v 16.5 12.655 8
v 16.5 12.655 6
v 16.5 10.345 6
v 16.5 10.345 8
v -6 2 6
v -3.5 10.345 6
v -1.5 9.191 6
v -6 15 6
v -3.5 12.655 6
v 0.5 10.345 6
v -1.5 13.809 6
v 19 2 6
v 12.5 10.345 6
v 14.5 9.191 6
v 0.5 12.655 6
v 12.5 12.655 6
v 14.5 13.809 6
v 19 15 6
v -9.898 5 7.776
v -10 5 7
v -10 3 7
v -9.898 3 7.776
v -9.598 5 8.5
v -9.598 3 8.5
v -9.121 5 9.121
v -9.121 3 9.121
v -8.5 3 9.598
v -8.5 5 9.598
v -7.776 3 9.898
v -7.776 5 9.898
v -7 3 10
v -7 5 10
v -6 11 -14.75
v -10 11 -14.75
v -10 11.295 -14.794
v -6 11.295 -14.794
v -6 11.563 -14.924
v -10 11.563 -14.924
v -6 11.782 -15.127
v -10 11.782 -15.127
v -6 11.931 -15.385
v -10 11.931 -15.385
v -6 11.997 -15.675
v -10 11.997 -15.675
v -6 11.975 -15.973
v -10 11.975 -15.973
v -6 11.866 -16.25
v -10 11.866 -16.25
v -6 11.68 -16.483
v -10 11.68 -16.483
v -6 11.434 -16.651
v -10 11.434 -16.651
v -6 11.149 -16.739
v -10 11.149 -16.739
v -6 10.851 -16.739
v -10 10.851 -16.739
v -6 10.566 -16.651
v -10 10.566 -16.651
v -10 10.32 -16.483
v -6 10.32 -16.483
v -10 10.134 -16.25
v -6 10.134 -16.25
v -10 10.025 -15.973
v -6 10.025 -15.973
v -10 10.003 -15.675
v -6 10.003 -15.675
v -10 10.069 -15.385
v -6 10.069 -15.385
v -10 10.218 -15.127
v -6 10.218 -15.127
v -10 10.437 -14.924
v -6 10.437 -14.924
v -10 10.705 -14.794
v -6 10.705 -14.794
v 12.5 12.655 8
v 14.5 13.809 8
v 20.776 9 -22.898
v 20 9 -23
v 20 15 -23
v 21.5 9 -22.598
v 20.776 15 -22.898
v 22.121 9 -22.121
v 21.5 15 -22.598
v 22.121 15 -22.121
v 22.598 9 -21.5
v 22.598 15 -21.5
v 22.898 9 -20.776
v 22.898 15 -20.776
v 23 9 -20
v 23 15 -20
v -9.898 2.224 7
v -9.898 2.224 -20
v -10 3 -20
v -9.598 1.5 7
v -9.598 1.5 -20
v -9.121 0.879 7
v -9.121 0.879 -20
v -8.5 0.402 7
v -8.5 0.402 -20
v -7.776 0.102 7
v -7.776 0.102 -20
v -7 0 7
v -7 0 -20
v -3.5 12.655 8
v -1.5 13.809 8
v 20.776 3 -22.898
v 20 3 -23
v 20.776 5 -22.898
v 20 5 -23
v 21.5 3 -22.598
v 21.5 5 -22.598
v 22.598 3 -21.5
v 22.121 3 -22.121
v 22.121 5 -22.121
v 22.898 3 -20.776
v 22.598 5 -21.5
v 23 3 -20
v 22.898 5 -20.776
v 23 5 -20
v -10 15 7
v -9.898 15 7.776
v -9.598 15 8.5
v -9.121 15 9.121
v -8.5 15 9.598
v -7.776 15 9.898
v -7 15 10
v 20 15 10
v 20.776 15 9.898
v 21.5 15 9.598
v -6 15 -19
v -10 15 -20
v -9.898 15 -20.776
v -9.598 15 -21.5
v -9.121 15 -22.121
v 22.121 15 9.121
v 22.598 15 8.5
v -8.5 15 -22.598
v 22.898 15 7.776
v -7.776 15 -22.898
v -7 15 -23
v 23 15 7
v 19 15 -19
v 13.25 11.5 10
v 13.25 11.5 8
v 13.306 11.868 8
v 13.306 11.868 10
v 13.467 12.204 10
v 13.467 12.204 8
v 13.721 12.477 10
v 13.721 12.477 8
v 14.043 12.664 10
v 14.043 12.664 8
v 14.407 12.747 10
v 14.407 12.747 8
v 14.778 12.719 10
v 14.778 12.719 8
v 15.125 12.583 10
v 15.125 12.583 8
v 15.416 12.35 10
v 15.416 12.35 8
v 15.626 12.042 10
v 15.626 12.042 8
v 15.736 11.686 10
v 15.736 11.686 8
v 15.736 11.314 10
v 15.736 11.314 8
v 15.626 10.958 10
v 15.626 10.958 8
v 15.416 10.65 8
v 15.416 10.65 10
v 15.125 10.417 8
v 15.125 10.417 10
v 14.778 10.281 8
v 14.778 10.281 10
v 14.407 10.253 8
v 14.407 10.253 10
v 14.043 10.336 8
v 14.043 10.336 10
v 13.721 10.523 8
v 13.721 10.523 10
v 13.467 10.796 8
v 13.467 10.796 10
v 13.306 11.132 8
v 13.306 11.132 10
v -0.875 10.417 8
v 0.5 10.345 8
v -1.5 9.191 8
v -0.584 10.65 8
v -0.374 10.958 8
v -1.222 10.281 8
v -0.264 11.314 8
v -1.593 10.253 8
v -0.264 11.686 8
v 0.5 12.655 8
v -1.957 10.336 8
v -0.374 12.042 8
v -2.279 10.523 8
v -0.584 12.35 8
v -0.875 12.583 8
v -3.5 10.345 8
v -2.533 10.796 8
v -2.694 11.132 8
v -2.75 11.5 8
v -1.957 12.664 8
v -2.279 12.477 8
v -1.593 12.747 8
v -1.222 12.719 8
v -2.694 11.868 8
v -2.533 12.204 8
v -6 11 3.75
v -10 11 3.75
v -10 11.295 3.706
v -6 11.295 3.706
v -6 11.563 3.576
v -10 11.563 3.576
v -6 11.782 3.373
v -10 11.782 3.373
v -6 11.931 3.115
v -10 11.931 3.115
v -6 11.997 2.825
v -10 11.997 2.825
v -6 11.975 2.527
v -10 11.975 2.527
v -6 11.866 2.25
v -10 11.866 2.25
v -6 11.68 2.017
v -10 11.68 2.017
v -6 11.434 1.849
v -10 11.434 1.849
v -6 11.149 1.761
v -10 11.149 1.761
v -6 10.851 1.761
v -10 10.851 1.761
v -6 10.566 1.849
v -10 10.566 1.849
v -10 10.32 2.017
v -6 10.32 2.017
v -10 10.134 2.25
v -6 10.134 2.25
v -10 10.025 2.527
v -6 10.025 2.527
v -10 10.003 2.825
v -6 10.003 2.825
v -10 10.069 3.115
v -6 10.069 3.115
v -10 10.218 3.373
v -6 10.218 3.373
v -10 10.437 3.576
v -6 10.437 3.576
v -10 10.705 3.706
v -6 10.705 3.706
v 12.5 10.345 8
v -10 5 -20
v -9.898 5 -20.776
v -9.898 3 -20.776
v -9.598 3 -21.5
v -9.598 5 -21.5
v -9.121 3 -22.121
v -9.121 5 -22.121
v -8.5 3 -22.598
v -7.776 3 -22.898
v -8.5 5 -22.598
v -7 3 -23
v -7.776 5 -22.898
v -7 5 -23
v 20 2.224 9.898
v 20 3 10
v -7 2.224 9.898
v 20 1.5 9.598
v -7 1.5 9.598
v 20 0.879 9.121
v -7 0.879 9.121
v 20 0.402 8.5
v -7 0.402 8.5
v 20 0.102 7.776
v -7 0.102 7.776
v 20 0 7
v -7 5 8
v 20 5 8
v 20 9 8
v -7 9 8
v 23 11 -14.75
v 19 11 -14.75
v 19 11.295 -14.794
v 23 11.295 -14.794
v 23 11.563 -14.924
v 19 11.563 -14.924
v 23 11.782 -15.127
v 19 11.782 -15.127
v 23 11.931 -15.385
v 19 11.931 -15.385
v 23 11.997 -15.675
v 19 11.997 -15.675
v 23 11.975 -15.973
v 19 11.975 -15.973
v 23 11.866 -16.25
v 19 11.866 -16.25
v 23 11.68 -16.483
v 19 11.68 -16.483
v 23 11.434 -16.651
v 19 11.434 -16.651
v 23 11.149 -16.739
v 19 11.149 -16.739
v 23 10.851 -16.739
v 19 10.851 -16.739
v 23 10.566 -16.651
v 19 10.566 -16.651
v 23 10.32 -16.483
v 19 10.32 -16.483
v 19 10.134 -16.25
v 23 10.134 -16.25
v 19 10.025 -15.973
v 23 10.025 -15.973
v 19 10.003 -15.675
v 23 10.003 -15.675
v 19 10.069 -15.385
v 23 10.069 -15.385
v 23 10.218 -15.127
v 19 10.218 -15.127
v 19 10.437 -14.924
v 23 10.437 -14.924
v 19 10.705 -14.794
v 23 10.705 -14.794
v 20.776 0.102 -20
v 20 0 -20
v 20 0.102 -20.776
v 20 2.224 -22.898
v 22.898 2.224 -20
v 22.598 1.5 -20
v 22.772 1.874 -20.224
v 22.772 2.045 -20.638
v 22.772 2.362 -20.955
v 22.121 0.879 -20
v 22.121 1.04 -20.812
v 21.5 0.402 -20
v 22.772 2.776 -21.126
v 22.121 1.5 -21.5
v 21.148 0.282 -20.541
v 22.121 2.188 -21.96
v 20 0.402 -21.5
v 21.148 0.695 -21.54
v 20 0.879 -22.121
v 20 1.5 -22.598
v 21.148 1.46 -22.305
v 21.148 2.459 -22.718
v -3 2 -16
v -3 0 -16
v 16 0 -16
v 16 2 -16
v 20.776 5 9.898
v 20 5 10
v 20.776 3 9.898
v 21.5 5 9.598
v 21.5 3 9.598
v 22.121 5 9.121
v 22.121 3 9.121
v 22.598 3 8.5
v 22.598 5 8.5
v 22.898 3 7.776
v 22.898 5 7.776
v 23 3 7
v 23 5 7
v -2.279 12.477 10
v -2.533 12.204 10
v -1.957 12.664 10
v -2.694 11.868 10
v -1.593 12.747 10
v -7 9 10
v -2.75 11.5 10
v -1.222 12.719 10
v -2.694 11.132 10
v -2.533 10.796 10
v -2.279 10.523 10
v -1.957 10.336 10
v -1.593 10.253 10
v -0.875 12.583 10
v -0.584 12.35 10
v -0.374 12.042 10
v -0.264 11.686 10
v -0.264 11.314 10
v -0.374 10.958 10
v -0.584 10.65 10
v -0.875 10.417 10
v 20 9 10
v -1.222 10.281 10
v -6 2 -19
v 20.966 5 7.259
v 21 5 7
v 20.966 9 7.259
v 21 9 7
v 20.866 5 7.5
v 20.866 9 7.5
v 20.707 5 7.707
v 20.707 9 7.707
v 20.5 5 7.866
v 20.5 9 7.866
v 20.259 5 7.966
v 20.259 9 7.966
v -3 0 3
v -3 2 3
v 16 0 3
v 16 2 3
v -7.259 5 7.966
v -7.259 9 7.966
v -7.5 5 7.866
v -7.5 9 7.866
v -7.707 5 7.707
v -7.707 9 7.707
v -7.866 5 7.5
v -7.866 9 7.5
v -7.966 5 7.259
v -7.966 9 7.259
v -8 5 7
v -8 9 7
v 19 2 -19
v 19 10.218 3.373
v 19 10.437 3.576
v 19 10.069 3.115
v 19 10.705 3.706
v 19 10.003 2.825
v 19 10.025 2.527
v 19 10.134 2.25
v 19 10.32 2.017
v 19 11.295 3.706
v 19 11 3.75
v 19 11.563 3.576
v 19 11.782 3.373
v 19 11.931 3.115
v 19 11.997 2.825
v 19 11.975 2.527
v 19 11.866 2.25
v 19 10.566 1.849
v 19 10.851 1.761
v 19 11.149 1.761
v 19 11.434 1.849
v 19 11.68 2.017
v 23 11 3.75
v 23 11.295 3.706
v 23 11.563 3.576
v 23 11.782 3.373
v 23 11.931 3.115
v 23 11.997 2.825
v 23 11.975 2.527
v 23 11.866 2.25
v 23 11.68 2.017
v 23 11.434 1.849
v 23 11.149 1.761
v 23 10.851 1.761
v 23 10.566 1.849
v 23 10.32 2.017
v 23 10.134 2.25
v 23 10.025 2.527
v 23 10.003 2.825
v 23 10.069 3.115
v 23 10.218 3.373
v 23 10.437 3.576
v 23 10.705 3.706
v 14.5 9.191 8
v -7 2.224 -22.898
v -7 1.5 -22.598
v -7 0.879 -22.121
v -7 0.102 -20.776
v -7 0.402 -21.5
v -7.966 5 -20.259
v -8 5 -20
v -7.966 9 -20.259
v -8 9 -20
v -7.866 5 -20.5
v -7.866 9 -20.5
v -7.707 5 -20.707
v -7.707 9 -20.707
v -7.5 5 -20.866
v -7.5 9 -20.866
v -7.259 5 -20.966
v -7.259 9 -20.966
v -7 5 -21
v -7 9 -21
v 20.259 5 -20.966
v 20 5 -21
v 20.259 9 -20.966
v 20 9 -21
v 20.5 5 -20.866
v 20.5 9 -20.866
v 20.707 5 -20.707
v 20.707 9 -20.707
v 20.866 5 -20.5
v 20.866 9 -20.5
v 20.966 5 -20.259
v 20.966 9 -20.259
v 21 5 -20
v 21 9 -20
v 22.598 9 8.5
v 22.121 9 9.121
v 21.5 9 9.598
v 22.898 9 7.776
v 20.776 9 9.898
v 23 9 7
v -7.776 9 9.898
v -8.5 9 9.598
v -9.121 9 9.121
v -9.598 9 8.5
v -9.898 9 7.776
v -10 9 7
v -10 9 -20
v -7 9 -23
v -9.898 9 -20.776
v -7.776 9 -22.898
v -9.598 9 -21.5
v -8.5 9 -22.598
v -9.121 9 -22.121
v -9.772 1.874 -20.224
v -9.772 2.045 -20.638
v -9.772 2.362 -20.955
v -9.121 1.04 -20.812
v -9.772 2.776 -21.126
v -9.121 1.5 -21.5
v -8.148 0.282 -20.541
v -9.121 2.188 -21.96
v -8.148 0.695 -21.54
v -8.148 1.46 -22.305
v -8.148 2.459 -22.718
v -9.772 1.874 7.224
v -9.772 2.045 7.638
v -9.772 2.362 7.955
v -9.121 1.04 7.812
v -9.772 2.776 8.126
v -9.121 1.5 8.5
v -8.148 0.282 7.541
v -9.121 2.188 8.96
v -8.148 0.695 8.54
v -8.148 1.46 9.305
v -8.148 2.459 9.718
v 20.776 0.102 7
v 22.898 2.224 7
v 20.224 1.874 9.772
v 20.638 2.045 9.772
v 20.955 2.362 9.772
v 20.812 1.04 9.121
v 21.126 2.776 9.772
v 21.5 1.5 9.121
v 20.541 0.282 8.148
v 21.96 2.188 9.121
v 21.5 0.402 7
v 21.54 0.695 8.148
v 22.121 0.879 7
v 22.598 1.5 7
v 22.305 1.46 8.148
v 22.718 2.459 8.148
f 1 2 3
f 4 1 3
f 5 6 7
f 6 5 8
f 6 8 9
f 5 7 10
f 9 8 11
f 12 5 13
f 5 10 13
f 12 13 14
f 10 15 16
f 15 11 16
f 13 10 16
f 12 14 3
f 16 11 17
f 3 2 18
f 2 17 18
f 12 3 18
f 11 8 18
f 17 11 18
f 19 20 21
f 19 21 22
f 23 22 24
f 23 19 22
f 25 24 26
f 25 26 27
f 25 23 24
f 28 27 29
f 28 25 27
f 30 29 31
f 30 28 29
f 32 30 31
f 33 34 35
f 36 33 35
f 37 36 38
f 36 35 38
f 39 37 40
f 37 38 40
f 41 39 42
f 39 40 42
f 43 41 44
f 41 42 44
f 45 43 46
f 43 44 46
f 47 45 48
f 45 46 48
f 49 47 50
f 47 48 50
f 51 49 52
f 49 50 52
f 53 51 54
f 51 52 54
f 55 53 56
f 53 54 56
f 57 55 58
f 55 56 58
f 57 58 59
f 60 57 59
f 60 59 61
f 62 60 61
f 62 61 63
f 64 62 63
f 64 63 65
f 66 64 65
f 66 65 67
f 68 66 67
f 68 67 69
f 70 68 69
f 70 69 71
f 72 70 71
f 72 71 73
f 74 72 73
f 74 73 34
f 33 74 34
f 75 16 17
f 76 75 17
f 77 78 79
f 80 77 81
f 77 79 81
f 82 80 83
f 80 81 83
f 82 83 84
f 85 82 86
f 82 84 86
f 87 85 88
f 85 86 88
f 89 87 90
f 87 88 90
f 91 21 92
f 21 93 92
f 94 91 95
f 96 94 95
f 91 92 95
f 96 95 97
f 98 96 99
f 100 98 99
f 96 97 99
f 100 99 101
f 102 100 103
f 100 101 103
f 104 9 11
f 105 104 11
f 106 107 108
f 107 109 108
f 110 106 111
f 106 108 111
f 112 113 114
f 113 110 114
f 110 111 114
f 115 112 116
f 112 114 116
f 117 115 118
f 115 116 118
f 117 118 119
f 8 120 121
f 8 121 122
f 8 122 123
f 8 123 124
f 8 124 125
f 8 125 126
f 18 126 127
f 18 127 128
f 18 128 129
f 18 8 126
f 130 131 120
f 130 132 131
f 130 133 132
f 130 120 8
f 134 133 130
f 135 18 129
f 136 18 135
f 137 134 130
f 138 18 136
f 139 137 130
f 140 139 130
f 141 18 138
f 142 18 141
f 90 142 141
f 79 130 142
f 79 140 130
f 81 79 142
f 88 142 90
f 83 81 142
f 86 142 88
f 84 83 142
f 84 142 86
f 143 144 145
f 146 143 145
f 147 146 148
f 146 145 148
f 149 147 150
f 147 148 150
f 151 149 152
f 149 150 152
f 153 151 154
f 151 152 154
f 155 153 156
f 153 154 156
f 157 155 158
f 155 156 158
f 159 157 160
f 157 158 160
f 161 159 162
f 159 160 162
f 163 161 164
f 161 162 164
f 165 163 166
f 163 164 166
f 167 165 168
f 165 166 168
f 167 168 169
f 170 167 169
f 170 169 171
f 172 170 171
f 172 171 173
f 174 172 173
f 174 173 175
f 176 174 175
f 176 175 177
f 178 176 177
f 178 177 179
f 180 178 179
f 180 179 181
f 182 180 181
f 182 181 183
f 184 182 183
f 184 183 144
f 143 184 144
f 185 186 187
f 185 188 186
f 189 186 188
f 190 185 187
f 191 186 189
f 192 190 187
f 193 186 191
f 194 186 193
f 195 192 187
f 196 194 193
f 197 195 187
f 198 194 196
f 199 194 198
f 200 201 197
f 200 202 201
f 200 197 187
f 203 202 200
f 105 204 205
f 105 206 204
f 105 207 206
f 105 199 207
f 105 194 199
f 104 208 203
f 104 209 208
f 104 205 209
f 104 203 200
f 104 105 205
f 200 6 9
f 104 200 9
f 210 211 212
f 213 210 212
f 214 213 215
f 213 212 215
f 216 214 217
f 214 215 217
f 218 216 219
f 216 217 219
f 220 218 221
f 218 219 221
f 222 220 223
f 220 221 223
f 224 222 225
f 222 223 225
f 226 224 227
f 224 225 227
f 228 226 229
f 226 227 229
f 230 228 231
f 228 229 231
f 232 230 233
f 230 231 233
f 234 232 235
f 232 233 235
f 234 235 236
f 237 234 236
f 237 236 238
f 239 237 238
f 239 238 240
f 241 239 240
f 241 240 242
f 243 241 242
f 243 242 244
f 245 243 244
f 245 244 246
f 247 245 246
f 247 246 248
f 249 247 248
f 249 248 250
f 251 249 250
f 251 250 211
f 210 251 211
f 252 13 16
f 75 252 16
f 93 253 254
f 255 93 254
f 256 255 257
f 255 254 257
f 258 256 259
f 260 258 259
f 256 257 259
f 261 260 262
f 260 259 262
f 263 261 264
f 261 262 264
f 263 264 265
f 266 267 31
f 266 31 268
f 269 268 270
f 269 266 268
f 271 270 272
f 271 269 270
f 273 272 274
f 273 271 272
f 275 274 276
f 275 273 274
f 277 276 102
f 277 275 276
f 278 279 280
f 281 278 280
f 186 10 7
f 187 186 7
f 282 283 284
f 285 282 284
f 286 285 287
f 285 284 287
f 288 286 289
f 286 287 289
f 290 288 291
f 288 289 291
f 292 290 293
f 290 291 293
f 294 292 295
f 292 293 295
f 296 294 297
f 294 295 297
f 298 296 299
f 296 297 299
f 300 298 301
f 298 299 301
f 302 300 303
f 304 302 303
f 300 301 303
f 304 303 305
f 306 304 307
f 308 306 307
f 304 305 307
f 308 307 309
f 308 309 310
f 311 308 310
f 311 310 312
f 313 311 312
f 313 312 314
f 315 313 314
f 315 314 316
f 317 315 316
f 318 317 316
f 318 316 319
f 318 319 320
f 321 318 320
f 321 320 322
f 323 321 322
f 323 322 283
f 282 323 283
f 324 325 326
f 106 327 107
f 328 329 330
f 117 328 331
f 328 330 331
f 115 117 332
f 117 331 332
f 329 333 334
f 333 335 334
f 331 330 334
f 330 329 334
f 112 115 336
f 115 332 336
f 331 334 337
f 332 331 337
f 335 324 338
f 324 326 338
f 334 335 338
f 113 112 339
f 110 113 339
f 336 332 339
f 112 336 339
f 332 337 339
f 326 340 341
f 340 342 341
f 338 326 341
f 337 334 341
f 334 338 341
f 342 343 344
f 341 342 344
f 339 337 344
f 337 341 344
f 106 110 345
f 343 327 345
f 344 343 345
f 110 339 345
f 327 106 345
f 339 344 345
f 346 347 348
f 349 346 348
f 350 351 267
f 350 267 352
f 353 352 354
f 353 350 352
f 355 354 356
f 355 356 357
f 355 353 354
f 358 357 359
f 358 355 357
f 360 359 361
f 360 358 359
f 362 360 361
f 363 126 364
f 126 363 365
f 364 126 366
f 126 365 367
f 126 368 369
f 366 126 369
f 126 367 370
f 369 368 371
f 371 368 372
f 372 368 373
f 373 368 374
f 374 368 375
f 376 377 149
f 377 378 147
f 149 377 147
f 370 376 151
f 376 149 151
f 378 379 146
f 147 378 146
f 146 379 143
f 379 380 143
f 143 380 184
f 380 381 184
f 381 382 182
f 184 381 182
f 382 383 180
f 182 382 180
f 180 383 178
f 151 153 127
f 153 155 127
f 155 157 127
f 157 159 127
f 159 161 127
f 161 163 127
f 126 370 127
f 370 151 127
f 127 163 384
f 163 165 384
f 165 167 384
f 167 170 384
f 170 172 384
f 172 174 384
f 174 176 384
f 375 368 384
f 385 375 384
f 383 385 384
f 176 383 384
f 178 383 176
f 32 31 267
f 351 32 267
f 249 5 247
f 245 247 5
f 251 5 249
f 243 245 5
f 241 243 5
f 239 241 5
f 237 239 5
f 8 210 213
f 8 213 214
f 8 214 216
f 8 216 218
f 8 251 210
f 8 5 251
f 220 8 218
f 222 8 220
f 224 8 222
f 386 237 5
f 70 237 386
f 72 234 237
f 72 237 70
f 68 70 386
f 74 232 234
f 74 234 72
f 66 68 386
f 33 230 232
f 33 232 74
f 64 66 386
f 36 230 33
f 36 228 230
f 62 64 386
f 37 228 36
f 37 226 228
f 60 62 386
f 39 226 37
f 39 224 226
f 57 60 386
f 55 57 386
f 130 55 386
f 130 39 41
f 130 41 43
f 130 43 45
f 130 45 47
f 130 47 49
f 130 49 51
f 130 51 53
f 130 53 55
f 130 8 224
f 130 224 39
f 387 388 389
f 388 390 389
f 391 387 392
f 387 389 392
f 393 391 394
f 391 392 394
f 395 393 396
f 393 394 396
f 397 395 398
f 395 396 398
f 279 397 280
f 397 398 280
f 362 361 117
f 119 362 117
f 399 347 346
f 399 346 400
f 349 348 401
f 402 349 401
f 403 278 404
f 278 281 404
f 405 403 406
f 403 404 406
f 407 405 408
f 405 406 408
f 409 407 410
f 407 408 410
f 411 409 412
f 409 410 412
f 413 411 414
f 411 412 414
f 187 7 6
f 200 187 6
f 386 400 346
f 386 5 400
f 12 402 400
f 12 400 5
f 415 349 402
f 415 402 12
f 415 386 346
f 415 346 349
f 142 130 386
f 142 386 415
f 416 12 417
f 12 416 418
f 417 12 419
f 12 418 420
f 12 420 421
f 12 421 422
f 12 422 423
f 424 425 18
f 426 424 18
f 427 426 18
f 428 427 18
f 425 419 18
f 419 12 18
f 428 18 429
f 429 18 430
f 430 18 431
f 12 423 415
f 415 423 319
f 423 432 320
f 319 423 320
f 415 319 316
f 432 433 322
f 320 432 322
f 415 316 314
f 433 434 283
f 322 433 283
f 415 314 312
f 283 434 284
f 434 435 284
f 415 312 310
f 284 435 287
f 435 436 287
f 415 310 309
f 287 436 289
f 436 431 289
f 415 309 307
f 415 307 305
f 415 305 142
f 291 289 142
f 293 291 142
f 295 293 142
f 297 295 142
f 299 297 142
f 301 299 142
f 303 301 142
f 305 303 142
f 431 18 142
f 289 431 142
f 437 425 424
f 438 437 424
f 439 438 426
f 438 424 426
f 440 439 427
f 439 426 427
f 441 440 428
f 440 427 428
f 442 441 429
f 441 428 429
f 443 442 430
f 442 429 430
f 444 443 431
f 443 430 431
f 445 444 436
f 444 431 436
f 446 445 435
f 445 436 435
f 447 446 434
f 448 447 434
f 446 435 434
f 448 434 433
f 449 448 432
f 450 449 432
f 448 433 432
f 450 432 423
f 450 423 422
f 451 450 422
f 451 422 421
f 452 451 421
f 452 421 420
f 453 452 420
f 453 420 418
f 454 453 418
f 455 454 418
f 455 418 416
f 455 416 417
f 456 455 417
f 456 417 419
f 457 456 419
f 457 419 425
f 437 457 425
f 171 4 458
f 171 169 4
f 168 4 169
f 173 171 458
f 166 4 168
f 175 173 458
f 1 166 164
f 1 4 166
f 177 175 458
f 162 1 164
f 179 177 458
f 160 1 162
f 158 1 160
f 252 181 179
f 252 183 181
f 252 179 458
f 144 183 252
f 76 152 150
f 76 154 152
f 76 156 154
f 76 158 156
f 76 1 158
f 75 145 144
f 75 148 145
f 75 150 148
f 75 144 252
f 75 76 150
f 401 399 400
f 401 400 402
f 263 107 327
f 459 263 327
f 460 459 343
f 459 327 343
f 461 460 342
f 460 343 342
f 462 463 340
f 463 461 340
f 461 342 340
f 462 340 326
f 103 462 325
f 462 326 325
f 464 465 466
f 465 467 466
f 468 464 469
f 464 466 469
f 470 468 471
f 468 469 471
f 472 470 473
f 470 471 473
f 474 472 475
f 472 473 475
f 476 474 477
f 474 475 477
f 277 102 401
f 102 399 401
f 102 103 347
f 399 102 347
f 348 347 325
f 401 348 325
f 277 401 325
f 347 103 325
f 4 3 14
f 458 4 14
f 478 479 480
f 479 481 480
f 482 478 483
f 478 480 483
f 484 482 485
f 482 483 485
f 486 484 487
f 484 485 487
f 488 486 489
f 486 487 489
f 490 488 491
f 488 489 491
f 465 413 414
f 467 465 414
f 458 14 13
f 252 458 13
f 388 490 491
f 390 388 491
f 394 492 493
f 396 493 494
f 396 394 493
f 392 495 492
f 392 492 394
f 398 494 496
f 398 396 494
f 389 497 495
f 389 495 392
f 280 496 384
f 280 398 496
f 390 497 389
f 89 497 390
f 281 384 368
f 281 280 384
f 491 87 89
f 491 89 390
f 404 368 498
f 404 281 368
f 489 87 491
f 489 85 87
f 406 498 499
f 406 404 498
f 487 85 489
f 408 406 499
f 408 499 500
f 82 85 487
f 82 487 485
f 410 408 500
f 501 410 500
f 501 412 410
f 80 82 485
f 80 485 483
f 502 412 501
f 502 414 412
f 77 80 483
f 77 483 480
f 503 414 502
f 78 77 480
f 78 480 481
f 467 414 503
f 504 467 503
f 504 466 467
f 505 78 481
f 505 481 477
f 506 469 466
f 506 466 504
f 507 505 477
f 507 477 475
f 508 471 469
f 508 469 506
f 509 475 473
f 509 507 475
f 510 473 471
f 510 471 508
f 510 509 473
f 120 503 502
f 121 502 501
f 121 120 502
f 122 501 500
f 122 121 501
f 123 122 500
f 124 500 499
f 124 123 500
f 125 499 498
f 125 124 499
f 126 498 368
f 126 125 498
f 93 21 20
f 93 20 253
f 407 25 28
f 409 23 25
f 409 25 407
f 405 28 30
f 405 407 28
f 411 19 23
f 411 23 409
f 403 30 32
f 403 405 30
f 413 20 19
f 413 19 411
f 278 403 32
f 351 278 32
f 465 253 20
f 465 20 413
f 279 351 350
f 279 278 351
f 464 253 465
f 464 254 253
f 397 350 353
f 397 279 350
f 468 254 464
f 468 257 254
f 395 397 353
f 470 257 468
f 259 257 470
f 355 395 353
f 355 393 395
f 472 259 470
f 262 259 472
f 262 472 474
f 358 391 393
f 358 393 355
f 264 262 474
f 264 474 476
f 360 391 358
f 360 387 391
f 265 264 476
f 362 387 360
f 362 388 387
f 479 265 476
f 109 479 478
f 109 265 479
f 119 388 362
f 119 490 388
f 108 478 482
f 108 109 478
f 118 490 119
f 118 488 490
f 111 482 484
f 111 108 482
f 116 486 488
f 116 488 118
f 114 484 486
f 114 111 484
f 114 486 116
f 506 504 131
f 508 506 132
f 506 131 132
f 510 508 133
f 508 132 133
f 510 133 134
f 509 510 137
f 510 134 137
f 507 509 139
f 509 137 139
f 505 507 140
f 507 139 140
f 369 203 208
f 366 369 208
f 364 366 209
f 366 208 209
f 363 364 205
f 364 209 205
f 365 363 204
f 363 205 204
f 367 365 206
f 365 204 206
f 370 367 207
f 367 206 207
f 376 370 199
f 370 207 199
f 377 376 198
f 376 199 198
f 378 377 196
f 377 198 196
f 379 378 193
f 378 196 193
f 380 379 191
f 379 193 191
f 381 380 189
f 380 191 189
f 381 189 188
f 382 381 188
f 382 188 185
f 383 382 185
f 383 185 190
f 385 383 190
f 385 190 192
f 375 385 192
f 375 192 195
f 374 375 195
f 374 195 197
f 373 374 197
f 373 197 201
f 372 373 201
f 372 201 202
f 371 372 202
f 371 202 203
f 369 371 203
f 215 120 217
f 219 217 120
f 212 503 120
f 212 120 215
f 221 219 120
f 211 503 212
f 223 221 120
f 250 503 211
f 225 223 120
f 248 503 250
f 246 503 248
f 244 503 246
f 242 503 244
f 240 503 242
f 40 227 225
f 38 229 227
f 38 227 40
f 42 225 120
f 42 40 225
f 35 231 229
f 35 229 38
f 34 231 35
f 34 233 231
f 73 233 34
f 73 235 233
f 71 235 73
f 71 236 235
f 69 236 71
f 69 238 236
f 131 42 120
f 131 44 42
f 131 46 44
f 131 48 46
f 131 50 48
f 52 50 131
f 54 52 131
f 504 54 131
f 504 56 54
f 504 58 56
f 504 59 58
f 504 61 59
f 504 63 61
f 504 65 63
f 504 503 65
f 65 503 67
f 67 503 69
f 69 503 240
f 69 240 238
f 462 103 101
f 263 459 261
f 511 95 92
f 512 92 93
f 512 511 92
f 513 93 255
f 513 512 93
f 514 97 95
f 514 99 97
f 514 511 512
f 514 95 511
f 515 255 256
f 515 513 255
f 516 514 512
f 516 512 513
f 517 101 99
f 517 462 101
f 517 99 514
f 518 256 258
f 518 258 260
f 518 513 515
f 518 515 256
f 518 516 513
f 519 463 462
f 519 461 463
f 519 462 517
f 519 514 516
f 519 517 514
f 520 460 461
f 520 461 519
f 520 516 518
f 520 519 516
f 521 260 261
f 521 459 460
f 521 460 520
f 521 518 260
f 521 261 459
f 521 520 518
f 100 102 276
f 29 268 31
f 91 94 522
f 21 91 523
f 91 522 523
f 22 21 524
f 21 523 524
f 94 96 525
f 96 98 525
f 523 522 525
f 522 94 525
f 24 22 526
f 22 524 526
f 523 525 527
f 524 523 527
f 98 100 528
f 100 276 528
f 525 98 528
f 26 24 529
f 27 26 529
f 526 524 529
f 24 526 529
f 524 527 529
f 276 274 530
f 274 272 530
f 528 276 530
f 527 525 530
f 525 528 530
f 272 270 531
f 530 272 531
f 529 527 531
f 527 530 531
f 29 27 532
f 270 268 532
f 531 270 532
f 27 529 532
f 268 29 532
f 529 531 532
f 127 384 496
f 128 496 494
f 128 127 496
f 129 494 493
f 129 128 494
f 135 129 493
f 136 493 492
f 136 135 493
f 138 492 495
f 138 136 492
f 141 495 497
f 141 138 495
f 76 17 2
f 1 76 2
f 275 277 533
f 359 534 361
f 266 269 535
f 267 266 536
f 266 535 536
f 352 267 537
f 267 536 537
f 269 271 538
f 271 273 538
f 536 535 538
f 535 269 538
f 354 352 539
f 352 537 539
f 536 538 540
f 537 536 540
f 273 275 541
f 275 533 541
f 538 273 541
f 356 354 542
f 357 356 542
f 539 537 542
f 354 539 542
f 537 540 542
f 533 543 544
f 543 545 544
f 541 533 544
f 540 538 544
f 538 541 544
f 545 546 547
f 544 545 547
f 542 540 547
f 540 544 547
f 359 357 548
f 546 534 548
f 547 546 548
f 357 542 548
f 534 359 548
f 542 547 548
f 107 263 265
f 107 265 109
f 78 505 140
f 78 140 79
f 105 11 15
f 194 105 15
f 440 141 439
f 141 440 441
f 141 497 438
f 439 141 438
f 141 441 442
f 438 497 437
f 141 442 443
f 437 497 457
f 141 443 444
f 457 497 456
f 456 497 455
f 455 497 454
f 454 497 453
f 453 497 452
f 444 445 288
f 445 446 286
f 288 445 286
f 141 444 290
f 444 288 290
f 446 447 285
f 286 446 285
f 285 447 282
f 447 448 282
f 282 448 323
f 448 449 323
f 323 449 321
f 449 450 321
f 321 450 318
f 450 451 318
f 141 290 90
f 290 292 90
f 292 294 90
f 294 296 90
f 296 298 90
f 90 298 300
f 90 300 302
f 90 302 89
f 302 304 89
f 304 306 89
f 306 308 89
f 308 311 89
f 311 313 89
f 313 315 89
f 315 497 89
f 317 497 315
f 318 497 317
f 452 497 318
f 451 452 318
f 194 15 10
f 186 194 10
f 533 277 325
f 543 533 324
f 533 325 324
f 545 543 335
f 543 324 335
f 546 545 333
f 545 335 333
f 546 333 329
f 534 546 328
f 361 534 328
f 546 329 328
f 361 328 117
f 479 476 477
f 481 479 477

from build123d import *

# Parameters (mm, degrees)
SKETCH_1_W          = 33
SKETCH_1_H          = 33
SKETCH_1_W_2        = 13
SKETCH_1_H_2        = 13
EXTRUDE_1_DEPTH     = 15
SKETCH_2_W          = 25
SKETCH_2_H          = 25
CUT_EXTRUDE_1_DEPTH = 13
FILLET_3_R          = 3
SKETCH_4_R          = 1
CUT_EXTRUDE_2_DEPTH = 43.930175867
SKETCH_11_W         = 19
SKETCH_11_H         = 19
CUT_EXTRUDE_5_DEPTH = 2
SKETCH_14_W         = 4
SKETCH_14_H         = 2
CUT_EXTRUDE_6_DEPTH = 2
SKETCH_20_R         = 1.25
CUT_EXTRUDE_7_DEPTH = 42.412558482


with BuildPart() as part:
    # Эскиз1 → Бобышка-Вытянуть1 (new body)
    with BuildSketch(Plane(origin=(0, 0, 0), x_dir=(1, 0, 0), z_dir=(0, 1, 0))):
        with Locations((6.5, 6.5)):
            Rectangle(SKETCH_1_W, SKETCH_1_H)
        with Locations((6.5, 6.5)):
            Rectangle(SKETCH_1_W_2, SKETCH_1_H_2, mode=Mode.SUBTRACT)
    extrude(amount=EXTRUDE_1_DEPTH)

    # Эскиз2 → Вырез-Вытянуть1 (cut)
    with BuildSketch(Plane(origin=(0, 15, 0), x_dir=(1, 0, 0), z_dir=(0, 1, 0))):
        with Locations((6.5, 6.5)):
            Rectangle(SKETCH_2_W, SKETCH_2_H)
    extrude(amount=-CUT_EXTRUDE_1_DEPTH, mode=Mode.SUBTRACT)

    # Скругление3
    fillet_3_edges = [part.edges().sort_by_distance(p)[0] for p in [
        (6.5, 0, -23),
        (23, 0, -6.5),
        (6.5, 0, 10),
        (-10, 0, -6.5),
        (-10, 7.5, -23),
        (23, 7.5, -23),
        (23, 7.5, 10),
        (-10, 7.5, 10),
    ]]
    fillet(fillet_3_edges, radius=FILLET_3_R)

    # Эскиз4 → Вырез-Вытянуть2 (cut, through all)
    with BuildSketch(Plane.ZY.offset(10)):
        with Locations((2.75, 11)):
            Circle(SKETCH_4_R)
        with Locations((-15.75, 11)):
            Circle(SKETCH_4_R)
    extrude(amount=-CUT_EXTRUDE_2_DEPTH, mode=Mode.SUBTRACT)

    # Эскиз11 → Вырез-Вытянуть5 (cut)
    with BuildSketch(Plane.XZ):
        with Locations((6.5, -6.5)):
            Rectangle(SKETCH_11_W, SKETCH_11_H)
    extrude(amount=-CUT_EXTRUDE_5_DEPTH, mode=Mode.SUBTRACT)

    # Вырез-По траектории2: sweep along a path in Эскиз16
    with BuildLine(Plane(origin=(0, 7, 0), x_dir=(0, 0, 1), z_dir=(0, -1, 0))) as sweep_2_path:
        Line((-23, 7), (-23, -20))
        ThreePointArc((-23, -20), (-22.121320344, -22.121320344), (-20, -23))
        Line((-20, -23), (7, -23))
        ThreePointArc((7, -23), (9.121320344, -22.121320344), (10, -20))
        Line((10, -20), (10, 7))
        ThreePointArc((10, 7), (9.121320344, 9.121320344), (7, 10))
        Line((7, 10), (-20, 10))
        ThreePointArc((-20, 10), (-22.121320344, 9.121320344), (-23, 7))
    # Эскиз14 → Вырез-По траектории2 (sweep, cut)
    with BuildSketch(Plane(origin=(-7, 0, 0), x_dir=(0, 1, 0), z_dir=(-1, 0, 0))):
        with Locations((7, 22)):
            Rectangle(SKETCH_14_W, SKETCH_14_H)
    sweep(path=sweep_2_path.line, mode=Mode.SUBTRACT)

    # Эскиз18 → Вырез-Вытянуть6 (cut)
    with BuildSketch(Plane(origin=(0, 0, 6), x_dir=(-1, 0, 0), z_dir=(0, 0, -1))):
        Polygon((-0.5, 10.345299462), (1.5, 9.190598923), (3.5, 10.345299462), (3.5, 12.654700538), (1.5, 13.809401077), (-0.5, 12.654700538), align=None)
        Polygon((-16.5, 10.345299462), (-14.5, 9.190598923), (-12.5, 10.345299462), (-12.5, 12.654700538), (-14.5, 13.809401077), (-16.5, 12.654700538), align=None)
    extrude(amount=-CUT_EXTRUDE_6_DEPTH, mode=Mode.SUBTRACT)

    # Эскиз20 → Вырез-Вытянуть7 (cut, through all)
    with BuildSketch(Plane(origin=(0, 0, 8), x_dir=(-1, 0, 0), z_dir=(0, 0, -1))):
        with Locations((-14.5, 11.5)):
            Circle(SKETCH_20_R)
        with Locations((1.5, 11.5)):
            Circle(SKETCH_20_R)
    extrude(amount=-CUT_EXTRUDE_7_DEPTH, mode=Mode.SUBTRACT)


solid = part.part
